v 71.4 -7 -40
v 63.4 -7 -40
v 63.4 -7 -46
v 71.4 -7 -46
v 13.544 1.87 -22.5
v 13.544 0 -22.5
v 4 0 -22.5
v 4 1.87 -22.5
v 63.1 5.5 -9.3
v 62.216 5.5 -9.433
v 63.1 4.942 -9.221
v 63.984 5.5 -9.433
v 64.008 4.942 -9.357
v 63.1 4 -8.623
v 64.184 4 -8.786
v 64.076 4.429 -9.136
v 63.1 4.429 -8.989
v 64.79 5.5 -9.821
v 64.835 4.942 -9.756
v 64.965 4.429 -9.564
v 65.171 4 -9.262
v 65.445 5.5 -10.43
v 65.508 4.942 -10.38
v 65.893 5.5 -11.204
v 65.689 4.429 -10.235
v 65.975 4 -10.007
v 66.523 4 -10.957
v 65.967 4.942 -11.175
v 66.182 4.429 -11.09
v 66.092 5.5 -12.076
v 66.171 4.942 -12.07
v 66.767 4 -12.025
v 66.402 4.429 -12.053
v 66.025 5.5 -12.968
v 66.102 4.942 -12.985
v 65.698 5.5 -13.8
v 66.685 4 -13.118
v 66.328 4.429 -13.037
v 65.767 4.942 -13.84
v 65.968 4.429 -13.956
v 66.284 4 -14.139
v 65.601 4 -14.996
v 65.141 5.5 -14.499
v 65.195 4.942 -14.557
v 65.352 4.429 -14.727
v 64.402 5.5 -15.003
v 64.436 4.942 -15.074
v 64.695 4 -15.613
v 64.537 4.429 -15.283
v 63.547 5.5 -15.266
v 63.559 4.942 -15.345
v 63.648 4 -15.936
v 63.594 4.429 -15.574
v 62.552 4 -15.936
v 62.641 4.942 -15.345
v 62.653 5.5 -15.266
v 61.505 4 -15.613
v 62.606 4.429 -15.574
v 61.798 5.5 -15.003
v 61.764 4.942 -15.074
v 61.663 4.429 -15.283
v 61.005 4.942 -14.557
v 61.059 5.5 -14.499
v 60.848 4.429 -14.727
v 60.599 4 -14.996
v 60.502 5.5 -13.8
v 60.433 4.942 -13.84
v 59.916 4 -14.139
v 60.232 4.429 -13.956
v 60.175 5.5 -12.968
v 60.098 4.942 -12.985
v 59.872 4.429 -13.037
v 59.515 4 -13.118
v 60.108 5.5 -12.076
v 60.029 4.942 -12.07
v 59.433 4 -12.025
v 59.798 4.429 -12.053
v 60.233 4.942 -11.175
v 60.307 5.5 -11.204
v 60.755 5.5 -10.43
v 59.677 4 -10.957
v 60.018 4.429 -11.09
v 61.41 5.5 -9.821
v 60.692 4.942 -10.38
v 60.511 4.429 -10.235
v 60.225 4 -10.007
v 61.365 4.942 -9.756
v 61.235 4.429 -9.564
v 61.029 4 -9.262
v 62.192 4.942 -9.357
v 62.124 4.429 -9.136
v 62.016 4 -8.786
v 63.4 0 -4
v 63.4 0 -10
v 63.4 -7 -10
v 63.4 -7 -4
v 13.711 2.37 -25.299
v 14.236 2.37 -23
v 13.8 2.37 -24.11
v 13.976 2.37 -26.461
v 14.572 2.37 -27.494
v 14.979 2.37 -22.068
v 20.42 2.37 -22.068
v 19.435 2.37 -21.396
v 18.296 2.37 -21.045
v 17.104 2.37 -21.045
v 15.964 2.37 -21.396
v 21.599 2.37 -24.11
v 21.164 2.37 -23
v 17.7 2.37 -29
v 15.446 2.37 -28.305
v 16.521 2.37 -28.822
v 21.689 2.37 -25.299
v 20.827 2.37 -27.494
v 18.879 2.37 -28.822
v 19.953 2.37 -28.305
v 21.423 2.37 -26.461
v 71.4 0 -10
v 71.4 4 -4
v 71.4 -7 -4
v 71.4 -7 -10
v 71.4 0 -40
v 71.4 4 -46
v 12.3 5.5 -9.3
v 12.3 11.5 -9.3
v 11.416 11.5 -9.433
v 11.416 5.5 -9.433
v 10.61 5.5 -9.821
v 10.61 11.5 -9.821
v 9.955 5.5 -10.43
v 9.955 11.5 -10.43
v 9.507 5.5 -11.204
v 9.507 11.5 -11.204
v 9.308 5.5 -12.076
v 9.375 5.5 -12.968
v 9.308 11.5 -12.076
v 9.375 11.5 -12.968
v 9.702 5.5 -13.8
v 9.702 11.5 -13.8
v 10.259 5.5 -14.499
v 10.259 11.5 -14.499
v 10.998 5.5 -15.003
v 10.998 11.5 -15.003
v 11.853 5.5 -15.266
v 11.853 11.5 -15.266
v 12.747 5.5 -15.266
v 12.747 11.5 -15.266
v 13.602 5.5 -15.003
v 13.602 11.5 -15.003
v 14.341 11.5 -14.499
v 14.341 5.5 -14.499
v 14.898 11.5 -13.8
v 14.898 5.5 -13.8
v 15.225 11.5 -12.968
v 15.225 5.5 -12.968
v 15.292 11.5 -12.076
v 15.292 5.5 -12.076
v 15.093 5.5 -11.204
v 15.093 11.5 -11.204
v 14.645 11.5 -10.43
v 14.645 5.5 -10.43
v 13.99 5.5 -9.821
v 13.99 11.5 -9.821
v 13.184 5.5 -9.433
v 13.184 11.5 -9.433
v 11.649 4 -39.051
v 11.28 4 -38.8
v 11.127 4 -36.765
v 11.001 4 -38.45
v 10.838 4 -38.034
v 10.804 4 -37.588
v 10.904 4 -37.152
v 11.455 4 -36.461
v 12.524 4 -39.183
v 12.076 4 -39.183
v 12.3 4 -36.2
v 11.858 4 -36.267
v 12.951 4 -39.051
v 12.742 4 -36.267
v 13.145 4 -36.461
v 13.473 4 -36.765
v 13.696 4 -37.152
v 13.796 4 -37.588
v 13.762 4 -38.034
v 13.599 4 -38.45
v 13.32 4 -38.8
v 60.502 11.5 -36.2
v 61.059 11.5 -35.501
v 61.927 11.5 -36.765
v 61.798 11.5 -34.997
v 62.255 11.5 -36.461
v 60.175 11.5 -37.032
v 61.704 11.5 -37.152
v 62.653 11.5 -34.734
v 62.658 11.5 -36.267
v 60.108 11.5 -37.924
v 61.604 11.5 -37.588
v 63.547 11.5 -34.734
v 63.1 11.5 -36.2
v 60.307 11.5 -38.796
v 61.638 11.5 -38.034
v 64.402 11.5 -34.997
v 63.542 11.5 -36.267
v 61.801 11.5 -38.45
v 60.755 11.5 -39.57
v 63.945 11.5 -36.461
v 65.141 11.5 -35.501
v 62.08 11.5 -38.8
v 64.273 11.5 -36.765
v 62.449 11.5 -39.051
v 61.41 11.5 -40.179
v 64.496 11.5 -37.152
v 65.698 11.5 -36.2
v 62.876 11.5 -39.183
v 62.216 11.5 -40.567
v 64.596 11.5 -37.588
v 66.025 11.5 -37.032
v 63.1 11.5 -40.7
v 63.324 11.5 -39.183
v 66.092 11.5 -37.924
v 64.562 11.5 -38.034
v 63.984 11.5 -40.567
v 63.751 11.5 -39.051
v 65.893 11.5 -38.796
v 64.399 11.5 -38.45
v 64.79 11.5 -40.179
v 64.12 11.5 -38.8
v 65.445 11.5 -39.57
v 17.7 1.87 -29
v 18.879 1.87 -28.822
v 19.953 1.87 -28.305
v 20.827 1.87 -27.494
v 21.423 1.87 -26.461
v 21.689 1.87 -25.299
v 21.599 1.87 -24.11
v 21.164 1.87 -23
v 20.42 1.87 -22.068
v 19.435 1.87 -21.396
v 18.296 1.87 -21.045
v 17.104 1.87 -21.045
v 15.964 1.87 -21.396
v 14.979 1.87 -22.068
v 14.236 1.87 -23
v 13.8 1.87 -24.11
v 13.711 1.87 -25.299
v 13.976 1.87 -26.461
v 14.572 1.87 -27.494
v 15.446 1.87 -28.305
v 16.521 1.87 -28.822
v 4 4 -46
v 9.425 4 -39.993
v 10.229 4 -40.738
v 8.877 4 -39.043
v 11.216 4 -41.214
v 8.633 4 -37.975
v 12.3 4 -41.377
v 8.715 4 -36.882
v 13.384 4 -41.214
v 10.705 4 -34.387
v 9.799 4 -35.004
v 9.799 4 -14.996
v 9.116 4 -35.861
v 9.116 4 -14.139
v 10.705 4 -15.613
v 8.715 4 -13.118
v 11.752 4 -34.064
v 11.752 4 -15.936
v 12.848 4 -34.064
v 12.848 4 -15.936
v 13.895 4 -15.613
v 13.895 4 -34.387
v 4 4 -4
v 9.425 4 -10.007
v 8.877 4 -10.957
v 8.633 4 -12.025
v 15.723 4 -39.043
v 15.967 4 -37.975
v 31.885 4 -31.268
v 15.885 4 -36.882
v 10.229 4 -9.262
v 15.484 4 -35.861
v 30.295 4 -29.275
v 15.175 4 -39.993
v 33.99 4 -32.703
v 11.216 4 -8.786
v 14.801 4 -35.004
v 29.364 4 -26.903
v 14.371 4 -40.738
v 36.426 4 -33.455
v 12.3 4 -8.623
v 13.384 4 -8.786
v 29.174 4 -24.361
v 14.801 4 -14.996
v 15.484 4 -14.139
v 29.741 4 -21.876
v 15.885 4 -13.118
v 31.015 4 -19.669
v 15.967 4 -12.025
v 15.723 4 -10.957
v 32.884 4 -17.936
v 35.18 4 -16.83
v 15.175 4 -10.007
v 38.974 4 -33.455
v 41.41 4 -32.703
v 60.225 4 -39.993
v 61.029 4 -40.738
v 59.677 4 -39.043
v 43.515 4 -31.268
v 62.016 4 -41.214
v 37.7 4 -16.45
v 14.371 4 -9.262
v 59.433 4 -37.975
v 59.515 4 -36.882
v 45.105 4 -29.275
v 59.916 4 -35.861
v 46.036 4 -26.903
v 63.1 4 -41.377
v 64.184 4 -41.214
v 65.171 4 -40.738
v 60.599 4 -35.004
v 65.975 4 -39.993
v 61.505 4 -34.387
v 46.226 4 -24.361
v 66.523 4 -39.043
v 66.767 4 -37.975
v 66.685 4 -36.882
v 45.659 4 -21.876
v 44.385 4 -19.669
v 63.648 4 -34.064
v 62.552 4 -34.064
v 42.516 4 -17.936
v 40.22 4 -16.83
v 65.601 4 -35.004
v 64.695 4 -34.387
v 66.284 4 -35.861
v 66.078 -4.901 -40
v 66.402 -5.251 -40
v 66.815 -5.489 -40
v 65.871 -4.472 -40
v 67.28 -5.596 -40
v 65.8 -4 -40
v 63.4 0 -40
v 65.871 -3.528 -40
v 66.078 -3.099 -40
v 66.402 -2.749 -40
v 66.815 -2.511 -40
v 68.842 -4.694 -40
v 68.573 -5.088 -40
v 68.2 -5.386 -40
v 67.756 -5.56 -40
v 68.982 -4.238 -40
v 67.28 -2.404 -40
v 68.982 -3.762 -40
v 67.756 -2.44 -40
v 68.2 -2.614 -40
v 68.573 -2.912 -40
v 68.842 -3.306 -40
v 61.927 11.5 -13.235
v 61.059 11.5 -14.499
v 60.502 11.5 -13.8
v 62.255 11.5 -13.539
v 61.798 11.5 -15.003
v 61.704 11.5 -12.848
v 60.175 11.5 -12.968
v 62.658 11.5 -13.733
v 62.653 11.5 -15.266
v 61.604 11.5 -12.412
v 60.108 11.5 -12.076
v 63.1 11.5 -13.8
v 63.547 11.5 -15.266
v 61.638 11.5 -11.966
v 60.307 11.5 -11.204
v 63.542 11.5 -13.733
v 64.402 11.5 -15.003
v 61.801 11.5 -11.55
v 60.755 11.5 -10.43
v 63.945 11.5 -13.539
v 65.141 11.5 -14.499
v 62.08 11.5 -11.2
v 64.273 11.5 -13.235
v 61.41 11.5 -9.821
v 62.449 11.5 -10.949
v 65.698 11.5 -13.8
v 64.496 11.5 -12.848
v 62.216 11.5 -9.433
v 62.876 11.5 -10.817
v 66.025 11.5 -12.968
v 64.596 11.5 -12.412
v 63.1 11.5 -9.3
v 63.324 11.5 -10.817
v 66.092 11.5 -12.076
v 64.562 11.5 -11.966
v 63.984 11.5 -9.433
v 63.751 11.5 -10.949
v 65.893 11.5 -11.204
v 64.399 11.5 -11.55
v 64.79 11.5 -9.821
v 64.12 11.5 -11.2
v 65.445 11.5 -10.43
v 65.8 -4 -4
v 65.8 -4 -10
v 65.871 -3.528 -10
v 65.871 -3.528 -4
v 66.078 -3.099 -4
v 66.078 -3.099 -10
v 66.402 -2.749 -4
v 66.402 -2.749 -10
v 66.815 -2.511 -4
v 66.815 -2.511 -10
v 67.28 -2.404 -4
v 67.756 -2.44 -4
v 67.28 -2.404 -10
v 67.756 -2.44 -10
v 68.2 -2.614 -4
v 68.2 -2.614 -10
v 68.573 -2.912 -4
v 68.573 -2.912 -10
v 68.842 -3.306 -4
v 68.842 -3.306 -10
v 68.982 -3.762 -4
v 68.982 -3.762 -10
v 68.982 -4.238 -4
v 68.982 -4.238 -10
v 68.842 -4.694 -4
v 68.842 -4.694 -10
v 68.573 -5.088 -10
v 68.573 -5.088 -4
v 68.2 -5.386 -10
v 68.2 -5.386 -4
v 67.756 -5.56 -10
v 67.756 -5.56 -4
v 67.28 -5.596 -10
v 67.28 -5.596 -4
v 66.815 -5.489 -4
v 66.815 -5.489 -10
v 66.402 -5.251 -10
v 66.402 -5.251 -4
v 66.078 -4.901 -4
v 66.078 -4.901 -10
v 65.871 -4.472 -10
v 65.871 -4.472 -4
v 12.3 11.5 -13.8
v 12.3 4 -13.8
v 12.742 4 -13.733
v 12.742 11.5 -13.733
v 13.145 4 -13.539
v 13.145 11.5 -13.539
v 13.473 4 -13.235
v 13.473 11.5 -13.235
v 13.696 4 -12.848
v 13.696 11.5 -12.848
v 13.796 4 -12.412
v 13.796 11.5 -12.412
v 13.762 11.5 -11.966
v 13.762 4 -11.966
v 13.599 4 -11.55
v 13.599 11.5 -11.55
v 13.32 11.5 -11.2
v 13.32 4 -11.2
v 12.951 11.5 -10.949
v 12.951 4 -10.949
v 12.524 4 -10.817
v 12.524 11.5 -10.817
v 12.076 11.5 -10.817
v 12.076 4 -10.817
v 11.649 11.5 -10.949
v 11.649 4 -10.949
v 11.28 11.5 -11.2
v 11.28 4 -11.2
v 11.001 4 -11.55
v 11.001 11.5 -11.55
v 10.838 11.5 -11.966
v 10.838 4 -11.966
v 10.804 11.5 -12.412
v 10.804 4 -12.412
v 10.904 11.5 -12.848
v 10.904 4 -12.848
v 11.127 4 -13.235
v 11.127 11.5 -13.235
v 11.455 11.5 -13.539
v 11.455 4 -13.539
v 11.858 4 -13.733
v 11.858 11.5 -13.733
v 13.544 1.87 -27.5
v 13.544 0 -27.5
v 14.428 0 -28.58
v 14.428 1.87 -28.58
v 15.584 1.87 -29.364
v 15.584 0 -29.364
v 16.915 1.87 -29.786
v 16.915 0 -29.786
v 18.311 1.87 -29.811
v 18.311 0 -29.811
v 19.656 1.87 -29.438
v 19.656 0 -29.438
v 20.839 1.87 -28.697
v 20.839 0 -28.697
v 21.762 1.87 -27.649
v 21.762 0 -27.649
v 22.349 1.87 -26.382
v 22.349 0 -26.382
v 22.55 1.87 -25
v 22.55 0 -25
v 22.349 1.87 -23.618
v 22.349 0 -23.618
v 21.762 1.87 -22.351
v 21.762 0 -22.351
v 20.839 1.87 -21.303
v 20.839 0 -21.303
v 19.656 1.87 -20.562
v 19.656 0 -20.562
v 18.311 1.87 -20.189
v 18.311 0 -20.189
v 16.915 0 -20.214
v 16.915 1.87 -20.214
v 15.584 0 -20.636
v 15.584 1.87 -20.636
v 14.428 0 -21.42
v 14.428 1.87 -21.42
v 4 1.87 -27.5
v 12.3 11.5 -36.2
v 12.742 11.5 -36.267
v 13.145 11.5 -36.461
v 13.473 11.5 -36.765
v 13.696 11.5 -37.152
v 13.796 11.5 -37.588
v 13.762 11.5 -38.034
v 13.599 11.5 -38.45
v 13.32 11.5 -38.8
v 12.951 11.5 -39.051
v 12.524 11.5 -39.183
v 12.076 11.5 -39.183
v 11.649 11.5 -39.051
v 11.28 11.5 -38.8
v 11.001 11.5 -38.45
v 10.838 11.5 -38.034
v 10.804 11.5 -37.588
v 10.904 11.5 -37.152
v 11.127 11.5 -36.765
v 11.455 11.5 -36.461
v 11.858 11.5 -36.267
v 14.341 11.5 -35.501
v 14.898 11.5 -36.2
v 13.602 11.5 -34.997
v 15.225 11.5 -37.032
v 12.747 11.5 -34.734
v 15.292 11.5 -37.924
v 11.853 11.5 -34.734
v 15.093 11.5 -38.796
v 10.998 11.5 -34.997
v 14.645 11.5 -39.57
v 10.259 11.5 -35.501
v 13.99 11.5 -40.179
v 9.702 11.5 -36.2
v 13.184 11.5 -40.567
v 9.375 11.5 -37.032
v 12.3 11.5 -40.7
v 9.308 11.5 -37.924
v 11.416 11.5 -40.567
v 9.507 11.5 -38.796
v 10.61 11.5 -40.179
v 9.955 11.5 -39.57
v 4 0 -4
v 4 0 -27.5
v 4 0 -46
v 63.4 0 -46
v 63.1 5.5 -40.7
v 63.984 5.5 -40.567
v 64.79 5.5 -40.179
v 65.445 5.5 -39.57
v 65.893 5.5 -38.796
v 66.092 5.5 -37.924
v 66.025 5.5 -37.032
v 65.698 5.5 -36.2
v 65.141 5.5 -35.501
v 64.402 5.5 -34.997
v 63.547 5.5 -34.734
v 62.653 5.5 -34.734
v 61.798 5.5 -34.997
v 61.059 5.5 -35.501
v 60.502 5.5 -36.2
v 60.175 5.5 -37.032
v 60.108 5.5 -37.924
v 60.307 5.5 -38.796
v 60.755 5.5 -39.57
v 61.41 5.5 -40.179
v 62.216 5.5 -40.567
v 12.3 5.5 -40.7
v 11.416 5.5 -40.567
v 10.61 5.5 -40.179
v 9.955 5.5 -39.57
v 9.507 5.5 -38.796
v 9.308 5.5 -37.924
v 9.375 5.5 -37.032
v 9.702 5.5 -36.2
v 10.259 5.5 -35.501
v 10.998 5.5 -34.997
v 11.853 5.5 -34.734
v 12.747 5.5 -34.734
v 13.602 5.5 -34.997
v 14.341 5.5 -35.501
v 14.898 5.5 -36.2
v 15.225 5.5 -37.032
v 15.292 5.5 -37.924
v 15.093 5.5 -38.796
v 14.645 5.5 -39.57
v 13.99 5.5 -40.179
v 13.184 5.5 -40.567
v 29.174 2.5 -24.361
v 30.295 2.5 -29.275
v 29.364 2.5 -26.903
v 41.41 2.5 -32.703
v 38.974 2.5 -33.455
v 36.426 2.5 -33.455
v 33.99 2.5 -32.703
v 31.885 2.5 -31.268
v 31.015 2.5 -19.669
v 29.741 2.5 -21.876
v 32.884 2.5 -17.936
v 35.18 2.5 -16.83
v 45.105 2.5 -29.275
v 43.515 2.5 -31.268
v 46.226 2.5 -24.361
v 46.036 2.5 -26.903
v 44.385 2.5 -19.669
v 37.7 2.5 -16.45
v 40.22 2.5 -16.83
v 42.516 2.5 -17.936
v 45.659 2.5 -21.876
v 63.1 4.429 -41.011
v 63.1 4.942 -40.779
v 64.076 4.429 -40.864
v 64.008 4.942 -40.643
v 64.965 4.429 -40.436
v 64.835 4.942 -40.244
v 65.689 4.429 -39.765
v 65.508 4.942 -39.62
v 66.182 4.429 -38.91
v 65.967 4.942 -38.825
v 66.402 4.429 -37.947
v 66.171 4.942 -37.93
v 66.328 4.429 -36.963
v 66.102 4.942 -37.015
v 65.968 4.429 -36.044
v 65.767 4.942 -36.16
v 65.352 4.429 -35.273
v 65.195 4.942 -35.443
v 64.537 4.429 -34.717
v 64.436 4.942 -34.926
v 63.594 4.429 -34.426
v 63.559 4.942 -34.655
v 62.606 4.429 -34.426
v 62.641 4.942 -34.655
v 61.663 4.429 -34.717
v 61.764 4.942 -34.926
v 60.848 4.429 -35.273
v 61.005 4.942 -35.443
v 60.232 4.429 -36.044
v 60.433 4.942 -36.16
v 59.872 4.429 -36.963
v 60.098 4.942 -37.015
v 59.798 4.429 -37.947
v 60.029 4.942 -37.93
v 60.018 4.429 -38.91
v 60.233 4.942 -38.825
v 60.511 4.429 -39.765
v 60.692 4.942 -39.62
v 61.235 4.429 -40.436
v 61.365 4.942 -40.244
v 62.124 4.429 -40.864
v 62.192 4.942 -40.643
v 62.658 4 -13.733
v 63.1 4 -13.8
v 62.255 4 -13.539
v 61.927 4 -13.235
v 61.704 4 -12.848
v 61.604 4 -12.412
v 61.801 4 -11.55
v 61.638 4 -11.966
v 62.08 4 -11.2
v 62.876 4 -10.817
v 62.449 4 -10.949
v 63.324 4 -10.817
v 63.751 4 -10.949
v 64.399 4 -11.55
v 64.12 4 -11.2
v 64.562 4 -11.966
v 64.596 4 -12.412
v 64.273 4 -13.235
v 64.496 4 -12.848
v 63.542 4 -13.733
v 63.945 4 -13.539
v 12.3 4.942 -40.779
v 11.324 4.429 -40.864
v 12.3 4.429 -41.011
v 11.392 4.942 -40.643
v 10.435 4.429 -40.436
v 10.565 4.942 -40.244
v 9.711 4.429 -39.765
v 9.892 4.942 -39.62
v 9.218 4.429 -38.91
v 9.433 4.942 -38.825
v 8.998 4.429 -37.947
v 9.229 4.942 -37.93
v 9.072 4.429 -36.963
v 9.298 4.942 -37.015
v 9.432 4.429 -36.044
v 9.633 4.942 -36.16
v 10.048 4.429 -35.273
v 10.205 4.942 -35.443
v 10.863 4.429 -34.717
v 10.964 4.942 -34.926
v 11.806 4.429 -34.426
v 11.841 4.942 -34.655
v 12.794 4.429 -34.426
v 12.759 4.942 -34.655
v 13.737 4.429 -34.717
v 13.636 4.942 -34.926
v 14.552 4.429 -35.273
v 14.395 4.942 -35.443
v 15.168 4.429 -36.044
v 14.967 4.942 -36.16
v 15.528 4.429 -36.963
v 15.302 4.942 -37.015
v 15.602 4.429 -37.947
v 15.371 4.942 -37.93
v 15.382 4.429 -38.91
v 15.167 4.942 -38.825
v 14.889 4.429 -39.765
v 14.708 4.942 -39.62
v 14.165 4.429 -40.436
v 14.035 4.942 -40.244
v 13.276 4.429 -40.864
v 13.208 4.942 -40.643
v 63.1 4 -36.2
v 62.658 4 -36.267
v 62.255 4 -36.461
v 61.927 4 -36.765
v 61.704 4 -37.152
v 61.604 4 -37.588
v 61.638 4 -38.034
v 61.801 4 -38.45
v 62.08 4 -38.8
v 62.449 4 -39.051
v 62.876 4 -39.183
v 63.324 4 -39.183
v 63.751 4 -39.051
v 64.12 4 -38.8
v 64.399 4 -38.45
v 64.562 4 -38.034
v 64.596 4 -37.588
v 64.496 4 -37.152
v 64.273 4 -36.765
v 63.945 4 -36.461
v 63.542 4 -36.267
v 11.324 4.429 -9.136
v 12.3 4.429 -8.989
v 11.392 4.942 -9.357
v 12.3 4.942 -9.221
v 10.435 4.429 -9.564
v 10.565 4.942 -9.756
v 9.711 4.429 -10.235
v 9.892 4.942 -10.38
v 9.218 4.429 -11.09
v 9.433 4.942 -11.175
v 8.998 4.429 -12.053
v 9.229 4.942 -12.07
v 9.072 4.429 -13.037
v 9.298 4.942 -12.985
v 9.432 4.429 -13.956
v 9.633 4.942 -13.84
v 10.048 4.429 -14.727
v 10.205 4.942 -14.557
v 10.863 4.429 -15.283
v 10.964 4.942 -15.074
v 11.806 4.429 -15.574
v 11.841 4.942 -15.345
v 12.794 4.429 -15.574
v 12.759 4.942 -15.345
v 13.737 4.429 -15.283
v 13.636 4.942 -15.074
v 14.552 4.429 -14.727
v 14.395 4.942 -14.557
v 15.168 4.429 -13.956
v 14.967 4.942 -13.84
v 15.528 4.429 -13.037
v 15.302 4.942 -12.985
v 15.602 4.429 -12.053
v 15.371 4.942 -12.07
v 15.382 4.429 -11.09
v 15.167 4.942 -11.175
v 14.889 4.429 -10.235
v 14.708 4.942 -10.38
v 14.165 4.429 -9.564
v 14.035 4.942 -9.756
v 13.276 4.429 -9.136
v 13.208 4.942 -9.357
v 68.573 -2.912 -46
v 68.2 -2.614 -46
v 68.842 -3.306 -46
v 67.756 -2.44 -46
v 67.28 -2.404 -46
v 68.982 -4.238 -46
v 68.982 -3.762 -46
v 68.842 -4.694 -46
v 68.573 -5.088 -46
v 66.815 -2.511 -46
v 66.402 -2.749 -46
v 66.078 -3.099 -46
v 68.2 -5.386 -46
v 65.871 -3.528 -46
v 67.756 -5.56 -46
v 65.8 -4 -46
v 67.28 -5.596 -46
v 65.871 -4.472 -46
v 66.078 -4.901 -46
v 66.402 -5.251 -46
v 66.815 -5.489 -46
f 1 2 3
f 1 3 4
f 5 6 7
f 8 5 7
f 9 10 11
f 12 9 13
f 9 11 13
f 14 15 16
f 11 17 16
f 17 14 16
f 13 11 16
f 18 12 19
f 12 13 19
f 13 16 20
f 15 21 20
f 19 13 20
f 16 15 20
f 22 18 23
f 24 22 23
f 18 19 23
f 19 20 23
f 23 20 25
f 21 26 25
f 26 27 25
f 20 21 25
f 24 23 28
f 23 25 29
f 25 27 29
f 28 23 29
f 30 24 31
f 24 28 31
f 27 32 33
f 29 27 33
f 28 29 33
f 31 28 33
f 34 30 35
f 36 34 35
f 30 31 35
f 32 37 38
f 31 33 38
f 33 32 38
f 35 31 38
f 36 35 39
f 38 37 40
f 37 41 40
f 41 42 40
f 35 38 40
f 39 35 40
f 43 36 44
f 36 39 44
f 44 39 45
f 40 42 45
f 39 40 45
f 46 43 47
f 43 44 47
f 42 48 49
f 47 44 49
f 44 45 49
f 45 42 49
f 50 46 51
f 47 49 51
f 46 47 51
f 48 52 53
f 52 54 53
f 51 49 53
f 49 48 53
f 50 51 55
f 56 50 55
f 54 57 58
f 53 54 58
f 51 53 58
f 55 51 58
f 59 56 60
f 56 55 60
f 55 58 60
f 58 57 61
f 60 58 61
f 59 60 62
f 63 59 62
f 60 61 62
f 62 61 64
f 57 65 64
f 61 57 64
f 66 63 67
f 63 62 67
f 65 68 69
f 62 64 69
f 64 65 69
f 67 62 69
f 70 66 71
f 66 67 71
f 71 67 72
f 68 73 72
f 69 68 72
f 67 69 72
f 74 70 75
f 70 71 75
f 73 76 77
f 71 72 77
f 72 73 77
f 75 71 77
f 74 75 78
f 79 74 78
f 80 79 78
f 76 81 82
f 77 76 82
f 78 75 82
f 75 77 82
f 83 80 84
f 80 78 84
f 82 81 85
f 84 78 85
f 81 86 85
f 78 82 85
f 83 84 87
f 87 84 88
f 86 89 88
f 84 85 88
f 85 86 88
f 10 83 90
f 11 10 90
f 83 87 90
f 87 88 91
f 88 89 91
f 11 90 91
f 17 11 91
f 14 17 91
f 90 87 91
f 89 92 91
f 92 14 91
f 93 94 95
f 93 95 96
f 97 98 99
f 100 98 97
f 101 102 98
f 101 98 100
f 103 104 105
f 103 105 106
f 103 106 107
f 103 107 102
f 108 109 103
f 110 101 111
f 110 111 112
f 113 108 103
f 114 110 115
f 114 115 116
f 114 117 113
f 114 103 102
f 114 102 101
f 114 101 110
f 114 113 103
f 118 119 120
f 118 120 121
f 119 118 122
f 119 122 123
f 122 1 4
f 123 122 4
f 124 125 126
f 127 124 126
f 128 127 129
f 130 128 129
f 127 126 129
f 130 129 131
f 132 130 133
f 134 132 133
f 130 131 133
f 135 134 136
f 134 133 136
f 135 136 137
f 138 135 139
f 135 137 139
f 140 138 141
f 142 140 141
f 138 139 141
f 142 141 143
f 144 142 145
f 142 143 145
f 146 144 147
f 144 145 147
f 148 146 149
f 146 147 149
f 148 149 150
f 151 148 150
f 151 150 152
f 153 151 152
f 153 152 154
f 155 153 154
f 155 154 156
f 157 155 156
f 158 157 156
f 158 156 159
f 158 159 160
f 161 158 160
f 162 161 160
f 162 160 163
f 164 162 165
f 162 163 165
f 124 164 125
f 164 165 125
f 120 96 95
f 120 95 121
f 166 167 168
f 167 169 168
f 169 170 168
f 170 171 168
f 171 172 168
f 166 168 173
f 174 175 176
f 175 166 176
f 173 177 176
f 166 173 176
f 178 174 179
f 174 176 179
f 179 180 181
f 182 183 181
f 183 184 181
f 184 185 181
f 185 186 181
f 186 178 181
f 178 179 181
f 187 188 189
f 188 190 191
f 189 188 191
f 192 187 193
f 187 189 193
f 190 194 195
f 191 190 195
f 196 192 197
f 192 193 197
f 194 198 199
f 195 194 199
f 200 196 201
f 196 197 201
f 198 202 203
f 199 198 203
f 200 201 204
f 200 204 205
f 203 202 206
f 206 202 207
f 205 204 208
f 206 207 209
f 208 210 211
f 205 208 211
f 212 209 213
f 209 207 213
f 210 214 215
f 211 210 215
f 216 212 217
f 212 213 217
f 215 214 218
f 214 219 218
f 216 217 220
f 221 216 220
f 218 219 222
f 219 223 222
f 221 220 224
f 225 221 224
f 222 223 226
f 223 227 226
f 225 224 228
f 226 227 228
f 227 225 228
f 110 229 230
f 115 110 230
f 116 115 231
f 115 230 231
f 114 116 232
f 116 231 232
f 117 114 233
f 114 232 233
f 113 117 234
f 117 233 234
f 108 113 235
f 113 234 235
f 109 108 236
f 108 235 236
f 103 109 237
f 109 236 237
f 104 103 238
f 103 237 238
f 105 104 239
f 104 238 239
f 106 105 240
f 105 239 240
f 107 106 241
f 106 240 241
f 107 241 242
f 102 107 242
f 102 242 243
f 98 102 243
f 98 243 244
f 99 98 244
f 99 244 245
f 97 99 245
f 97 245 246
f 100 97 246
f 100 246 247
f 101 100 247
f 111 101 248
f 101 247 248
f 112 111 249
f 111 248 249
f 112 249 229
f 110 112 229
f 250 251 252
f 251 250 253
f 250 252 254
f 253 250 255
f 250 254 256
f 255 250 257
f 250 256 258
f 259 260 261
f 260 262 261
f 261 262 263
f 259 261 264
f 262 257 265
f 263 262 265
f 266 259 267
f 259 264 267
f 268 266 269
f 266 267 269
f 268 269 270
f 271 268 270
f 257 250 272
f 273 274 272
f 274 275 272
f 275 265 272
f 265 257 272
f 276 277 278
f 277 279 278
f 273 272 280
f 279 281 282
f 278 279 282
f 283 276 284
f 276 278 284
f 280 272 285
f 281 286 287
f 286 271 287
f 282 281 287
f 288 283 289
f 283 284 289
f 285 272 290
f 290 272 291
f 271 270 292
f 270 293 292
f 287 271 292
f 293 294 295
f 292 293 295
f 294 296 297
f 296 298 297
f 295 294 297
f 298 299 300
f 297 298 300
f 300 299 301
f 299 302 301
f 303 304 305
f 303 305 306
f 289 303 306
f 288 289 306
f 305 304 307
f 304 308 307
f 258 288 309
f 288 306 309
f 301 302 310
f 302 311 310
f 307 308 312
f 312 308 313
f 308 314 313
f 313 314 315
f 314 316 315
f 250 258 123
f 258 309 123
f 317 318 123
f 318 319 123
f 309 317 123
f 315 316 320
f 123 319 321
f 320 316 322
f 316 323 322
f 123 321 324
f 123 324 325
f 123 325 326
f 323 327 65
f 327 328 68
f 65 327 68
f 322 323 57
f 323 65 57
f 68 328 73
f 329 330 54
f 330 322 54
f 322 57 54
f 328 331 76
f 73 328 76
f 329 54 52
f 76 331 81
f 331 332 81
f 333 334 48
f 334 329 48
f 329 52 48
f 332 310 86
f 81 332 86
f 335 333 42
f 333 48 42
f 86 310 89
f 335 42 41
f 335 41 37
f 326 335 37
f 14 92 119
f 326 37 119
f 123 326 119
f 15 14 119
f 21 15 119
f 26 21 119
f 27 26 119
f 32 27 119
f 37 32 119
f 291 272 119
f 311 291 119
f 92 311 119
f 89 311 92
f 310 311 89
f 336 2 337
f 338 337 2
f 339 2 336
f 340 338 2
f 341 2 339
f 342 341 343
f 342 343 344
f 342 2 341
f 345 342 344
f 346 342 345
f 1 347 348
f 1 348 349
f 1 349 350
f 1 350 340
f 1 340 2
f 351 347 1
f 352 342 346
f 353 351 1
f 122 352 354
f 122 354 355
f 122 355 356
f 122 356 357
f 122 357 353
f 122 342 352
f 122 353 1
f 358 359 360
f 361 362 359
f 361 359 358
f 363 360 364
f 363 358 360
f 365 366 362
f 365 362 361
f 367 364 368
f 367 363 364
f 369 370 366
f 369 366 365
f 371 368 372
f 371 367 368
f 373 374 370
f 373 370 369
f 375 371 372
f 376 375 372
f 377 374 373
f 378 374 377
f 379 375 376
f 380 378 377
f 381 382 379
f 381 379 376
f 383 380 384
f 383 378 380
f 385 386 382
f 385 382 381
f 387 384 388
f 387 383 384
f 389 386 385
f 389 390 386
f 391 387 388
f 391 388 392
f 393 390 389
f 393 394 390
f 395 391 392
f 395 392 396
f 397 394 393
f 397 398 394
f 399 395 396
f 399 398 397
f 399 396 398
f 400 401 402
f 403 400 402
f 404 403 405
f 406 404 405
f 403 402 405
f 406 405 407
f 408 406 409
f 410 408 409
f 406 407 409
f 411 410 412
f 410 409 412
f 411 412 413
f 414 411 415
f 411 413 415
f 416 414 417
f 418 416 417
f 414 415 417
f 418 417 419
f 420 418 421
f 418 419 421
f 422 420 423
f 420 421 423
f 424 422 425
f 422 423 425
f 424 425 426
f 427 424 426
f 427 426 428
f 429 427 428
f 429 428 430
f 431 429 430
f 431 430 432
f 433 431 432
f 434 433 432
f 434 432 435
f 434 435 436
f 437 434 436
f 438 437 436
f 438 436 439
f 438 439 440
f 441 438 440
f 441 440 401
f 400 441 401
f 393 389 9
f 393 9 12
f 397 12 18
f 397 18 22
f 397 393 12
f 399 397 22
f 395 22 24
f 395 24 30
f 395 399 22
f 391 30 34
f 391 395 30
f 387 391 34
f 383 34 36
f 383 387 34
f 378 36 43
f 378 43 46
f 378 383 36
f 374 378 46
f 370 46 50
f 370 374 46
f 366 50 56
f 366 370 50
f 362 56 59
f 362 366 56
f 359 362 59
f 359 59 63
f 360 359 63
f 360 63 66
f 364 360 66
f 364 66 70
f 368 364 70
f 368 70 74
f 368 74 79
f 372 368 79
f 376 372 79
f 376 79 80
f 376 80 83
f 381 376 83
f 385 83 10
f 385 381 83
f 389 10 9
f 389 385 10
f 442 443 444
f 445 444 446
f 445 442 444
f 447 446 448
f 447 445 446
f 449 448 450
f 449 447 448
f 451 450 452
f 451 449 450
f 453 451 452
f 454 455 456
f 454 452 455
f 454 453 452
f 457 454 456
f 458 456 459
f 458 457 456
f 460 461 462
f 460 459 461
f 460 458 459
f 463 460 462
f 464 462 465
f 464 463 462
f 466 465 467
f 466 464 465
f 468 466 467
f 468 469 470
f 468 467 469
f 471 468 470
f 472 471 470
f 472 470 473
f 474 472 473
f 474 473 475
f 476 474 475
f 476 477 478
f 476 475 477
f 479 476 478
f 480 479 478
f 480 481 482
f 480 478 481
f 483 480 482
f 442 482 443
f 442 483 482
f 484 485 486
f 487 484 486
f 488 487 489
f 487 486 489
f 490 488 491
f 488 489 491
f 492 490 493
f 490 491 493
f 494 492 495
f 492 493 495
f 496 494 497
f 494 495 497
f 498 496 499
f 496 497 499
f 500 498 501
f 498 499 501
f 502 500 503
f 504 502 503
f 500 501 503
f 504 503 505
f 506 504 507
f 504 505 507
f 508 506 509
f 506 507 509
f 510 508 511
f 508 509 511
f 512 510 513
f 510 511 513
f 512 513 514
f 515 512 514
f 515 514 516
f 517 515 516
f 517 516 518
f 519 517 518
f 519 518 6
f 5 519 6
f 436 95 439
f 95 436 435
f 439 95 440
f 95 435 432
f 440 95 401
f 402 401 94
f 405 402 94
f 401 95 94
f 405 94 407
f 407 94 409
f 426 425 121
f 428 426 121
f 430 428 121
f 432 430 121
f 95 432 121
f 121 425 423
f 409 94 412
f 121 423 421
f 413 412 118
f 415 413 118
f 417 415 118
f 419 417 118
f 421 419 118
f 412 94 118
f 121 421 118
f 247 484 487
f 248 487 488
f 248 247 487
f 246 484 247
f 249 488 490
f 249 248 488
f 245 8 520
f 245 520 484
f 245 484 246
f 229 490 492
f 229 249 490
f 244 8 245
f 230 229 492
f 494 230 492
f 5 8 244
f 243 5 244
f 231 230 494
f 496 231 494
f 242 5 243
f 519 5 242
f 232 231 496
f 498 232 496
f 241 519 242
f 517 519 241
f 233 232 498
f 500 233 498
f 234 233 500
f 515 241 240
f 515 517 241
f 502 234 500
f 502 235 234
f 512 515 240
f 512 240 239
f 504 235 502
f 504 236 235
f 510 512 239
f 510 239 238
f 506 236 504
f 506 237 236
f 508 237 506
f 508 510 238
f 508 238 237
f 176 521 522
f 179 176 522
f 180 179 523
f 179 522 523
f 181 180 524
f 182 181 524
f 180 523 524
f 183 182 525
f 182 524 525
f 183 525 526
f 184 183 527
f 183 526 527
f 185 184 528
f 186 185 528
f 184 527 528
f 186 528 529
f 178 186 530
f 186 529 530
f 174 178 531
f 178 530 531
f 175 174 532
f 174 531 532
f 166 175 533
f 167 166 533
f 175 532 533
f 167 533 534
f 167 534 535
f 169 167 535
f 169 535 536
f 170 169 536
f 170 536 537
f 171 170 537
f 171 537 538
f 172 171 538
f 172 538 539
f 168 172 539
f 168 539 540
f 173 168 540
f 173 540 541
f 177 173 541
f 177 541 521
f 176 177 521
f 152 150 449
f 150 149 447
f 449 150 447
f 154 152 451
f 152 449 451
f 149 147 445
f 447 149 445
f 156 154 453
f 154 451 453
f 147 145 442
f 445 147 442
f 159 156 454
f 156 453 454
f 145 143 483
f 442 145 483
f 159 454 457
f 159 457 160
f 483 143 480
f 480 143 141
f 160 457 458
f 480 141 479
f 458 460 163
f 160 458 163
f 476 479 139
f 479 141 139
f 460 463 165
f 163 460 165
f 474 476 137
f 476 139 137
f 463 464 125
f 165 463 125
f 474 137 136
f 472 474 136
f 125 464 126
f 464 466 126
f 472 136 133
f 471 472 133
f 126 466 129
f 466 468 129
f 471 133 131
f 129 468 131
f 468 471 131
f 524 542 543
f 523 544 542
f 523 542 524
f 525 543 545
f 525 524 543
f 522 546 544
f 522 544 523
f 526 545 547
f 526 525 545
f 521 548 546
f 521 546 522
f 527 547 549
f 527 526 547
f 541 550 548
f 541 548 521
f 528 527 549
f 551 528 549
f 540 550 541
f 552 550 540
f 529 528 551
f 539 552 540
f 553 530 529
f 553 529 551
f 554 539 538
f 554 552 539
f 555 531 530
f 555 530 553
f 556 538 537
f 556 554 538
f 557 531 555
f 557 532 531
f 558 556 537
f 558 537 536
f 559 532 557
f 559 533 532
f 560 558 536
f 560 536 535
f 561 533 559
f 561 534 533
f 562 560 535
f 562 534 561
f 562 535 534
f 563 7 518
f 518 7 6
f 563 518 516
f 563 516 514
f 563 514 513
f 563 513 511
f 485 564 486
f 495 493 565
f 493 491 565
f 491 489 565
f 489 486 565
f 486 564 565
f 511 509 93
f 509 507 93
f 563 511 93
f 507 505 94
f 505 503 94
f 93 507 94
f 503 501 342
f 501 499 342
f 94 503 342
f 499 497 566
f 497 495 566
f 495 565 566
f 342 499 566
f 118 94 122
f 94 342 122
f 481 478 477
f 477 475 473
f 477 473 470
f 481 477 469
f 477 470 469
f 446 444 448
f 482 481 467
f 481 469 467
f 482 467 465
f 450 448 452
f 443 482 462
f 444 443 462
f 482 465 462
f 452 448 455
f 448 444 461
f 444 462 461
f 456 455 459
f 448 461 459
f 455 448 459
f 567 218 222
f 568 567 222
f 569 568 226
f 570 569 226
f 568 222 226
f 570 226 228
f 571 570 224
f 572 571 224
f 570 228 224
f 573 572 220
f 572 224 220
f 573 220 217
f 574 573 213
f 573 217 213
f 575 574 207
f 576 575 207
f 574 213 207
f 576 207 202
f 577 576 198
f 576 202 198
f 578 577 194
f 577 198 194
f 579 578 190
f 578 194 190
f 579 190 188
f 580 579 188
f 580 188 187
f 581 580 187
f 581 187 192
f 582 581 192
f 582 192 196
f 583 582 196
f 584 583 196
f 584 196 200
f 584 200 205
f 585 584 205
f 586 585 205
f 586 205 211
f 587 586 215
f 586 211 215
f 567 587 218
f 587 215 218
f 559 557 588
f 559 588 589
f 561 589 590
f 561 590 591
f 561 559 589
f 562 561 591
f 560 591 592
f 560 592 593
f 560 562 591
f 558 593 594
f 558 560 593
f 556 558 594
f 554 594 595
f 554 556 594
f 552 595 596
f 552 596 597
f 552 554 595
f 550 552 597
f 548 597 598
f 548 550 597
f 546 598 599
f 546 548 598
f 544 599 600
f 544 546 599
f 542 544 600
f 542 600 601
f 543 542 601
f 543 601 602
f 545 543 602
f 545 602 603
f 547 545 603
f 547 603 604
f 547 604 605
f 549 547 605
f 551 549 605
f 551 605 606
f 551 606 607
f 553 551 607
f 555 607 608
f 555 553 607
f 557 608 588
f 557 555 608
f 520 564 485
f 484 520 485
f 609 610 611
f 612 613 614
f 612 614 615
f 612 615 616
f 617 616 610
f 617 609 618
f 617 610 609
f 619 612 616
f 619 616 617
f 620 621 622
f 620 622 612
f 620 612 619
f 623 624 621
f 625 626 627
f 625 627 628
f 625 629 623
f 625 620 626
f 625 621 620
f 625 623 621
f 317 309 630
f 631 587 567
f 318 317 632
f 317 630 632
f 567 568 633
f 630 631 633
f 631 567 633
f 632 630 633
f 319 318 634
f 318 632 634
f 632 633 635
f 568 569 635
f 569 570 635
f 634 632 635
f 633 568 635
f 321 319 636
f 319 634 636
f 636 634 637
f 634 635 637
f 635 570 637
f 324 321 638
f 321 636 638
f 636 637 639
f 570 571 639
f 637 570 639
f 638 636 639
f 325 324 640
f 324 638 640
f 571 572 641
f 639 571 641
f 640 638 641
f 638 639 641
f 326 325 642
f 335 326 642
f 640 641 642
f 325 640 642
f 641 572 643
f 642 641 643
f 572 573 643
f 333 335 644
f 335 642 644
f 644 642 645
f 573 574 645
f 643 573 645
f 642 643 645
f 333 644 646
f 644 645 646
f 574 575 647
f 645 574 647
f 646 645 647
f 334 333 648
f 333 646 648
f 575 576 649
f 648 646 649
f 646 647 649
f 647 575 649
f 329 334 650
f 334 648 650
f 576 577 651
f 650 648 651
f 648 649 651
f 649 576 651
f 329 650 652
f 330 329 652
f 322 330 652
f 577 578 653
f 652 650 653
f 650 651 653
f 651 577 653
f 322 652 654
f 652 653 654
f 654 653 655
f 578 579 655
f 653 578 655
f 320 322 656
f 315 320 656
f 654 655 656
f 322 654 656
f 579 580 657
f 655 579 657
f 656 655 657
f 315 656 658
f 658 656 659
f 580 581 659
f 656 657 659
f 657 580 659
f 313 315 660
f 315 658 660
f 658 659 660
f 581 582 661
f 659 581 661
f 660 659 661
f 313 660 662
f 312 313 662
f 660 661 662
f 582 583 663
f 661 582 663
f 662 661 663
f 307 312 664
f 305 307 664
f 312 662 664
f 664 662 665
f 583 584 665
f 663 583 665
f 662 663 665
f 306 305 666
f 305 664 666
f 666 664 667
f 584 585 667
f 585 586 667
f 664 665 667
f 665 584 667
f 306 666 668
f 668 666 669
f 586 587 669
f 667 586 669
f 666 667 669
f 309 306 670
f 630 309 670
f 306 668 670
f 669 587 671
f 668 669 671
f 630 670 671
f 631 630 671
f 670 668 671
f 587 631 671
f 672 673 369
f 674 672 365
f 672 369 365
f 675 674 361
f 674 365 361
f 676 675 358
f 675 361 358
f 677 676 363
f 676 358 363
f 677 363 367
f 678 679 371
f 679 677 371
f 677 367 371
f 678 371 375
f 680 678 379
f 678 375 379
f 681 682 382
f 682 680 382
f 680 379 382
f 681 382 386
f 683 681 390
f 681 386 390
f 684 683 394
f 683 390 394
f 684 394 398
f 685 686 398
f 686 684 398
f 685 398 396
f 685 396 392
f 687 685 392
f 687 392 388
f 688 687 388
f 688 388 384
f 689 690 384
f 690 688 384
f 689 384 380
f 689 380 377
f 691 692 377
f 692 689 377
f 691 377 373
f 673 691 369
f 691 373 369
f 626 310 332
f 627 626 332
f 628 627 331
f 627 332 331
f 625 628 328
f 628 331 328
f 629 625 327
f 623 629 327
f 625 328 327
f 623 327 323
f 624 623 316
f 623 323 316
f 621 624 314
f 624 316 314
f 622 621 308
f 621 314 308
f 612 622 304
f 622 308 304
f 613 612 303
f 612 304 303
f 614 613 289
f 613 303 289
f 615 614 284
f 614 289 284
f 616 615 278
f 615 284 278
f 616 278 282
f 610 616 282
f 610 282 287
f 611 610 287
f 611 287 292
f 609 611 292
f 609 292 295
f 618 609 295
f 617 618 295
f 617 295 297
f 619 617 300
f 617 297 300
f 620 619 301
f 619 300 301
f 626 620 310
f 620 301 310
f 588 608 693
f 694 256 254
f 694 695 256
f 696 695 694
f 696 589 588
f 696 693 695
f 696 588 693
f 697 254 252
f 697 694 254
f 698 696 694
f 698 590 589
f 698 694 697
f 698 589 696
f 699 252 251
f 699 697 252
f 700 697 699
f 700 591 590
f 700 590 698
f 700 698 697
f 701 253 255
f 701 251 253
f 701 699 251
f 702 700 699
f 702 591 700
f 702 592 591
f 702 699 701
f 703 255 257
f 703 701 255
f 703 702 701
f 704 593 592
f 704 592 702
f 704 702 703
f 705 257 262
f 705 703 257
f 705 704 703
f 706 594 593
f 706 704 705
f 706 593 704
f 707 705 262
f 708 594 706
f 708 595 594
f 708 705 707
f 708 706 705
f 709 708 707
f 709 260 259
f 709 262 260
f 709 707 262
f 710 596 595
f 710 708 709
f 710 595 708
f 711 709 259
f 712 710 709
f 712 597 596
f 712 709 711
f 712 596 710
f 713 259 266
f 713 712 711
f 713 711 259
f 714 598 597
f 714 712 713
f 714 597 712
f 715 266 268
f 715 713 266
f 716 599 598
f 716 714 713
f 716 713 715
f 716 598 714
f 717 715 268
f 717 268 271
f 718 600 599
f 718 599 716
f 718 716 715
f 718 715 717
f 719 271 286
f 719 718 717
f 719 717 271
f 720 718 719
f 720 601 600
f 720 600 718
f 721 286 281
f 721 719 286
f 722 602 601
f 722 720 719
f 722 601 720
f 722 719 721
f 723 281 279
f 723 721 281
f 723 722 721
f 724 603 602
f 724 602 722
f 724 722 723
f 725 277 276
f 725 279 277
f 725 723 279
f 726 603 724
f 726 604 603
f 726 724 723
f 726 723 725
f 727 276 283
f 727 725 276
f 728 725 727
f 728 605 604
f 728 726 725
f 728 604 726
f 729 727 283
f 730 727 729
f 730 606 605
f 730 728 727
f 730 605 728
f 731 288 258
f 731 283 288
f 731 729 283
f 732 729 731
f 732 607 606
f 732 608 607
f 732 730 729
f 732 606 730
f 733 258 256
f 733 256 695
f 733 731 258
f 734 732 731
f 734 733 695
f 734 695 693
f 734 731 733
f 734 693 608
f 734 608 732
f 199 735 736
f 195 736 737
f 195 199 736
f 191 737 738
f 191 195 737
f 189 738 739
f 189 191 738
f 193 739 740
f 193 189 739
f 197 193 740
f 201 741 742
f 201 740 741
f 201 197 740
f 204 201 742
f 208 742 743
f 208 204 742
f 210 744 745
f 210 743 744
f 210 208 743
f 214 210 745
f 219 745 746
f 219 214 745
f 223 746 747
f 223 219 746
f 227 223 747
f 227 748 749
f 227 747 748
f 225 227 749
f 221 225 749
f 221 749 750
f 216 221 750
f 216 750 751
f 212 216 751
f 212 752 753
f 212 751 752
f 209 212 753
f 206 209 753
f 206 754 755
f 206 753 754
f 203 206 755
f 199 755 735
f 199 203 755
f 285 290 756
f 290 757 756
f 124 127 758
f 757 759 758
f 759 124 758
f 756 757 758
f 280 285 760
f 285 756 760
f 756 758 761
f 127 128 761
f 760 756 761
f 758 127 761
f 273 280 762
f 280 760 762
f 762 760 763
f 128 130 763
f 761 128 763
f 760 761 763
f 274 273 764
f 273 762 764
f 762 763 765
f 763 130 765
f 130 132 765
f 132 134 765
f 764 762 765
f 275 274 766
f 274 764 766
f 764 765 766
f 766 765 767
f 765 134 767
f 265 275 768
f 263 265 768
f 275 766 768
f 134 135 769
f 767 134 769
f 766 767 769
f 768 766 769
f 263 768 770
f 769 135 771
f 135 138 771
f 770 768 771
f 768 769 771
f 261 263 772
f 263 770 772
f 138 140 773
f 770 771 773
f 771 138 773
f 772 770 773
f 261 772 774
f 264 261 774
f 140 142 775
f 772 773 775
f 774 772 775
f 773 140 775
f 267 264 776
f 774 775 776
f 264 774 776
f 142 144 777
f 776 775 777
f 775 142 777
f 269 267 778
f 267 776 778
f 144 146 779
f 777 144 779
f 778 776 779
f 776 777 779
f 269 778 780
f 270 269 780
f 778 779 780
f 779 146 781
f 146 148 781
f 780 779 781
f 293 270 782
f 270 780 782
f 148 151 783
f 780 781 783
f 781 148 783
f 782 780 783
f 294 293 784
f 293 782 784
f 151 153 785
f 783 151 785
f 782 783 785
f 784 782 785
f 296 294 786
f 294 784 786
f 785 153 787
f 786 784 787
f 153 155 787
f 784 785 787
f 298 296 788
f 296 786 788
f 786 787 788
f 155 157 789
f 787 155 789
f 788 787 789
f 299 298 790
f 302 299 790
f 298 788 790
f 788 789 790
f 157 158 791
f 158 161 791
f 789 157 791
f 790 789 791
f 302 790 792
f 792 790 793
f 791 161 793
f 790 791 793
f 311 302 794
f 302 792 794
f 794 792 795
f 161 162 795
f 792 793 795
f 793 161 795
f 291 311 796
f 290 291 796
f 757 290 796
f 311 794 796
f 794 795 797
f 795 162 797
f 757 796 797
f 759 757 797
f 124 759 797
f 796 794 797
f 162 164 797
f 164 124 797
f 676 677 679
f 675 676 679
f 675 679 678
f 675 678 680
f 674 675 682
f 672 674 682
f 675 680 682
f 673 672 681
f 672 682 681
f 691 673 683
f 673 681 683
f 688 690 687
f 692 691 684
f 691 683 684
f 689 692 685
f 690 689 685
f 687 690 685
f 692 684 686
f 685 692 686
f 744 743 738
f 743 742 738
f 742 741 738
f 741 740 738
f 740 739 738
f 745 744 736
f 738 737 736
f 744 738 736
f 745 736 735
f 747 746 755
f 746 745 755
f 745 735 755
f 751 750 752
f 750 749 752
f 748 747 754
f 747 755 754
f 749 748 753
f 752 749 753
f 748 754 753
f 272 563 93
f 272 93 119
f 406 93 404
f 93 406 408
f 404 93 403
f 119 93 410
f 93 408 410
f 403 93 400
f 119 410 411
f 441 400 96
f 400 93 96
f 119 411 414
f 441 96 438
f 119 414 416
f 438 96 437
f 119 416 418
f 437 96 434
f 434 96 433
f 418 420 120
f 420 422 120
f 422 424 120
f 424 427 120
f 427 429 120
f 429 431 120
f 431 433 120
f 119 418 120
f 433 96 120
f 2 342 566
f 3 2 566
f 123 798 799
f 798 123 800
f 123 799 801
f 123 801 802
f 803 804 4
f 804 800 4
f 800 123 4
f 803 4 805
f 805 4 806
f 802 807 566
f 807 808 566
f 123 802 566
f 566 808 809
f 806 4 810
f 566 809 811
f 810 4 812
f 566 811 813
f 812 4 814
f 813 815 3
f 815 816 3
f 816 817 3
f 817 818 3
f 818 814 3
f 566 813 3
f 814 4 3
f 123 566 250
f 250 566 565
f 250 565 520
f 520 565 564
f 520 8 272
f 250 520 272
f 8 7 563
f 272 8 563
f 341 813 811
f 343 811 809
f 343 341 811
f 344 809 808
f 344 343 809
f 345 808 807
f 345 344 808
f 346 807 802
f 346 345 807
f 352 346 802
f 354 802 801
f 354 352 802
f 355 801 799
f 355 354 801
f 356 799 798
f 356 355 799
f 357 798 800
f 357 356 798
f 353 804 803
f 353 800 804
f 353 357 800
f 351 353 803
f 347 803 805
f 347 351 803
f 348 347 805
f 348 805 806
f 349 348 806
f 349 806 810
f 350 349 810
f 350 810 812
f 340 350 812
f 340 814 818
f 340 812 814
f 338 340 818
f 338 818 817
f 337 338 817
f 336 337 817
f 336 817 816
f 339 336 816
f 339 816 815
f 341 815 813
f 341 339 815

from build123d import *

# Parameters (mm, degrees)
SKETCH2_W                 = 75.4
SKETCH2_H                 = 50
BOSS_EXTRUDE1_DEPTH       = 3.5
SKETCH3_R                 = 1.5
CUT_EXTRUDE1_DEPTH        = 4
BOSS_EXTRUDE2_START       = 8
SKETCH4_R                 = 3
SKETCH4_R_2               = 1.5
BOSS_EXTRUDE2_DEPTH       = 8
MIRROR2_START             = 8
MIRROR2_COPY_1_SKETCH_R   = 3
MIRROR2_COPY_1_SKETCH_R_2 = 1.5
MIRROR2_COPY_1_DEPTH      = 8
FILLET1_R                 = 2
SKETCH6_W                 = 75.4
SKETCH6_H                 = 50
BOSS_EXTRUDE3_DEPTH       = 4
SKETCH9_R                 = 8.55
CUT_EXTRUDE2_DEPTH        = 1.5
SKETCH10_R                = 4.85
CUT_EXTRUDE3_DEPTH        = 1.87
SKETCH11_R                = 4
CUT_EXTRUDE4_DEPTH        = 0.5
CUT_EXTRUDE6_DEPTH        = 1.87
SKETCH14_W                = 8
SKETCH14_H                = 6
BOSS_EXTRUDE6_DEPTH       = 8
SKETCH15_R                = 1.6
CUT_EXTRUDE7_DEPTH        = 8
SKETCH16_W                = 4
SKETCH16_H                = 5
CUT_EXTRUDE8_DEPTH        = 8
SKETCH17_W                = 8
SKETCH17_H                = 6
CUT_EXTRUDE9_DEPTH        = 1


with BuildPart() as part:
    # Sketch2 → Boss-Extrude1 (new body)
    with BuildSketch(Plane(origin=(0, 0, 0), x_dir=(1, 0, 0), z_dir=(0, 1, 0))):
        with Locations((37.7, 25)):
            Rectangle(SKETCH2_W, SKETCH2_H)
    extrude(amount=BOSS_EXTRUDE1_DEPTH)

    # Sketch3 → Cut-Extrude1 (cut)
    with BuildSketch(Plane(origin=(0, 3.5, 0), x_dir=(1, 0, 0), z_dir=(0, 1, 0))):
        with Locations(Location((12.3, 37.7, 0), (0, 0, 270))):
            Circle(SKETCH3_R)
        with Locations(Location((12.3, 12.3, 0), (0, 0, 270))):
            Circle(SKETCH3_R)
        with Locations(Location((63.1, 37.7, 0), (0, 0, 270))):
            Circle(SKETCH3_R)
        with Locations(Location((63.1, 12.3, 0), (0, 0, 270))):
            Circle(SKETCH3_R)
    extrude(amount=-CUT_EXTRUDE1_DEPTH, mode=Mode.SUBTRACT)

    # Sketch4 → Boss-Extrude2 (add)
    with BuildSketch(Plane(origin=(0, 3.5, 0), x_dir=(1, 0, 0), z_dir=(0, 1, 0)).offset(BOSS_EXTRUDE2_START)):
        with Locations(Location((12.3, 37.7, 0), (0, 0, 90))):
            Circle(SKETCH4_R)
        with Locations(Location((12.3, 37.7, 0), (0, 0, 270))):
            Circle(SKETCH4_R_2, mode=Mode.SUBTRACT)
    boss_extrude2 = extrude(amount=-BOSS_EXTRUDE2_DEPTH)

    # Mirror1: Boss-Extrude2 across plane
    add(boss_extrude2.mirror(Plane.XY.offset(-25)))

    # Mirror2: Boss-Extrude2 across plane
    add(boss_extrude2.mirror(Plane.ZY.offset(-37.7)))

    # Mirror2 copy 1 sketch → Mirror2 copy 1 (add)
    with BuildSketch(Plane(origin=(75.4, 3.5, -50), x_dir=(-1, 0, 0), z_dir=(0, 1, 0)).offset(MIRROR2_START)):
        with Locations(Location((12.3, 37.7, 0), (0, 0, 90))):
            Circle(MIRROR2_COPY_1_SKETCH_R)
        with Locations(Location((12.3, 37.7, 0), (0, 0, 270))):
            Circle(MIRROR2_COPY_1_SKETCH_R_2, mode=Mode.SUBTRACT)
    extrude(amount=-MIRROR2_COPY_1_DEPTH)

    # Fillet1
    fillet1_edges = [part.edges().sort_by_distance(p)[0] for p in [
        (12.3, 3.5, -34.7),
        (12.3, 3.5, -15.3),
        (63.1, 3.5, -15.3),
        (63.1, 3.5, -34.7),
    ]]
    fillet(fillet1_edges, radius=FILLET1_R)

    # Sketch6 → Boss-Extrude3 (add)
    with BuildSketch(Plane.XZ):
        with Locations((37.7, -25)):
            Rectangle(SKETCH6_W, SKETCH6_H)
    extrude(amount=-BOSS_EXTRUDE3_DEPTH)

    # Sketch9 → Cut-Extrude2 (cut)
    with BuildSketch(Plane(origin=(0, 4, 0), x_dir=(1, 0, 0), z_dir=(0, 1, 0))):
        with Locations(Location((37.7, 25, 0), (0, 0, 270))):
            Circle(SKETCH9_R)
    extrude(amount=-CUT_EXTRUDE2_DEPTH, mode=Mode.SUBTRACT)

    # Sketch10 → Cut-Extrude3 (cut)
    with BuildSketch(Plane.XZ):
        with Locations(Location((17.699747997, -25, 0), (0, 0, 270))):
            Circle(SKETCH10_R)
    extrude(amount=-CUT_EXTRUDE3_DEPTH, mode=Mode.SUBTRACT)

    # Sketch11 → Cut-Extrude4 (cut)
    with BuildSketch(Plane.XZ.offset(-1.87)):
        with Locations(Location((17.699747997, -25, 0), (0, 0, 270))):
            Circle(SKETCH11_R)
    extrude(amount=-CUT_EXTRUDE4_DEPTH, mode=Mode.SUBTRACT)

    # Sketch12 → Cut-Extrude6 (cut)
    with BuildSketch(Plane.XZ):
        with BuildLine():
            Line((12.849747997, -25), (12.849747997, -27.5))
            Line((12.849747997, -27.5), (13.543728267, -27.5))
            ThreePointArc((13.543728267, -27.5), (13.026462445, -26.297267187), (12.849747997, -25))
        make_face()
        with BuildLine():
            Line((12.849747997, -22.5), (12.849747997, -25))
            ThreePointArc((12.849747997, -25), (13.026462445, -23.702732813), (13.543728267, -22.5))
            Line((13.543728267, -22.5), (12.849747997, -22.5))
        make_face()
        Polygon((0, -22.5), (0, -27.5), (12.849747997, -27.5), (12.849747997, -25), (12.849747997, -22.5), align=None)
    extrude(amount=-CUT_EXTRUDE6_DEPTH, mode=Mode.SUBTRACT)

    # Sketch14 → Boss-Extrude6 (add)
    with BuildSketch(Plane.XZ):
        with Locations((67.4, -7)):
            Rectangle(SKETCH14_W, SKETCH14_H)
    boss_extrude6 = extrude(amount=BOSS_EXTRUDE6_DEPTH)

    # Sketch15 → Cut-Extrude7 (cut)
    with BuildSketch(Plane(origin=(0, 0, -10), x_dir=(-1, 0, 0), z_dir=(0, 0, -1))):
        with Locations((-67.4, -4)):
            Circle(SKETCH15_R)
    cut_extrude7 = extrude(amount=-CUT_EXTRUDE7_DEPTH, mode=Mode.SUBTRACT)

    # Mirror4: Boss-Extrude6, Cut-Extrude7 across plane
    add(boss_extrude6.mirror(Plane.XY.offset(-25)))
    add(cut_extrude7.mirror(Plane.XY.offset(-25)), mode=Mode.SUBTRACT)

    # Sketch16 → Cut-Extrude8 (cut)
    with BuildSketch(Plane.XZ):
        Polygon((4, -46), (4, -27.5), (0, -27.5), (0, -50), (4, -50), align=None)
        with Locations((2, -25)):
            Rectangle(SKETCH16_W, SKETCH16_H)
        Polygon((4, -22.5), (4, -4), (4, 0), (0, 0), (0, -22.5), align=None)
        Polygon((63.4, -4), (71.4, -4), (71.4, -10), (71.4, -40), (71.4, -46), (63.4, -46), (4, -46), (4, -50), (75.4, -50), (75.4, 0), (4, 0), (4, -4), align=None)
    extrude(amount=-CUT_EXTRUDE8_DEPTH, mode=Mode.SUBTRACT)

    # Sketch17 → Cut-Extrude9 (cut)
    with BuildSketch(Plane.XZ.offset(8)):
        with Locations((67.4, -43)):
            Rectangle(SKETCH17_W, SKETCH17_H)
        with Locations((67.4, -7)):
            Rectangle(SKETCH17_W, SKETCH17_H)
    extrude(amount=-CUT_EXTRUDE9_DEPTH, mode=Mode.SUBTRACT)


solid = part.part
